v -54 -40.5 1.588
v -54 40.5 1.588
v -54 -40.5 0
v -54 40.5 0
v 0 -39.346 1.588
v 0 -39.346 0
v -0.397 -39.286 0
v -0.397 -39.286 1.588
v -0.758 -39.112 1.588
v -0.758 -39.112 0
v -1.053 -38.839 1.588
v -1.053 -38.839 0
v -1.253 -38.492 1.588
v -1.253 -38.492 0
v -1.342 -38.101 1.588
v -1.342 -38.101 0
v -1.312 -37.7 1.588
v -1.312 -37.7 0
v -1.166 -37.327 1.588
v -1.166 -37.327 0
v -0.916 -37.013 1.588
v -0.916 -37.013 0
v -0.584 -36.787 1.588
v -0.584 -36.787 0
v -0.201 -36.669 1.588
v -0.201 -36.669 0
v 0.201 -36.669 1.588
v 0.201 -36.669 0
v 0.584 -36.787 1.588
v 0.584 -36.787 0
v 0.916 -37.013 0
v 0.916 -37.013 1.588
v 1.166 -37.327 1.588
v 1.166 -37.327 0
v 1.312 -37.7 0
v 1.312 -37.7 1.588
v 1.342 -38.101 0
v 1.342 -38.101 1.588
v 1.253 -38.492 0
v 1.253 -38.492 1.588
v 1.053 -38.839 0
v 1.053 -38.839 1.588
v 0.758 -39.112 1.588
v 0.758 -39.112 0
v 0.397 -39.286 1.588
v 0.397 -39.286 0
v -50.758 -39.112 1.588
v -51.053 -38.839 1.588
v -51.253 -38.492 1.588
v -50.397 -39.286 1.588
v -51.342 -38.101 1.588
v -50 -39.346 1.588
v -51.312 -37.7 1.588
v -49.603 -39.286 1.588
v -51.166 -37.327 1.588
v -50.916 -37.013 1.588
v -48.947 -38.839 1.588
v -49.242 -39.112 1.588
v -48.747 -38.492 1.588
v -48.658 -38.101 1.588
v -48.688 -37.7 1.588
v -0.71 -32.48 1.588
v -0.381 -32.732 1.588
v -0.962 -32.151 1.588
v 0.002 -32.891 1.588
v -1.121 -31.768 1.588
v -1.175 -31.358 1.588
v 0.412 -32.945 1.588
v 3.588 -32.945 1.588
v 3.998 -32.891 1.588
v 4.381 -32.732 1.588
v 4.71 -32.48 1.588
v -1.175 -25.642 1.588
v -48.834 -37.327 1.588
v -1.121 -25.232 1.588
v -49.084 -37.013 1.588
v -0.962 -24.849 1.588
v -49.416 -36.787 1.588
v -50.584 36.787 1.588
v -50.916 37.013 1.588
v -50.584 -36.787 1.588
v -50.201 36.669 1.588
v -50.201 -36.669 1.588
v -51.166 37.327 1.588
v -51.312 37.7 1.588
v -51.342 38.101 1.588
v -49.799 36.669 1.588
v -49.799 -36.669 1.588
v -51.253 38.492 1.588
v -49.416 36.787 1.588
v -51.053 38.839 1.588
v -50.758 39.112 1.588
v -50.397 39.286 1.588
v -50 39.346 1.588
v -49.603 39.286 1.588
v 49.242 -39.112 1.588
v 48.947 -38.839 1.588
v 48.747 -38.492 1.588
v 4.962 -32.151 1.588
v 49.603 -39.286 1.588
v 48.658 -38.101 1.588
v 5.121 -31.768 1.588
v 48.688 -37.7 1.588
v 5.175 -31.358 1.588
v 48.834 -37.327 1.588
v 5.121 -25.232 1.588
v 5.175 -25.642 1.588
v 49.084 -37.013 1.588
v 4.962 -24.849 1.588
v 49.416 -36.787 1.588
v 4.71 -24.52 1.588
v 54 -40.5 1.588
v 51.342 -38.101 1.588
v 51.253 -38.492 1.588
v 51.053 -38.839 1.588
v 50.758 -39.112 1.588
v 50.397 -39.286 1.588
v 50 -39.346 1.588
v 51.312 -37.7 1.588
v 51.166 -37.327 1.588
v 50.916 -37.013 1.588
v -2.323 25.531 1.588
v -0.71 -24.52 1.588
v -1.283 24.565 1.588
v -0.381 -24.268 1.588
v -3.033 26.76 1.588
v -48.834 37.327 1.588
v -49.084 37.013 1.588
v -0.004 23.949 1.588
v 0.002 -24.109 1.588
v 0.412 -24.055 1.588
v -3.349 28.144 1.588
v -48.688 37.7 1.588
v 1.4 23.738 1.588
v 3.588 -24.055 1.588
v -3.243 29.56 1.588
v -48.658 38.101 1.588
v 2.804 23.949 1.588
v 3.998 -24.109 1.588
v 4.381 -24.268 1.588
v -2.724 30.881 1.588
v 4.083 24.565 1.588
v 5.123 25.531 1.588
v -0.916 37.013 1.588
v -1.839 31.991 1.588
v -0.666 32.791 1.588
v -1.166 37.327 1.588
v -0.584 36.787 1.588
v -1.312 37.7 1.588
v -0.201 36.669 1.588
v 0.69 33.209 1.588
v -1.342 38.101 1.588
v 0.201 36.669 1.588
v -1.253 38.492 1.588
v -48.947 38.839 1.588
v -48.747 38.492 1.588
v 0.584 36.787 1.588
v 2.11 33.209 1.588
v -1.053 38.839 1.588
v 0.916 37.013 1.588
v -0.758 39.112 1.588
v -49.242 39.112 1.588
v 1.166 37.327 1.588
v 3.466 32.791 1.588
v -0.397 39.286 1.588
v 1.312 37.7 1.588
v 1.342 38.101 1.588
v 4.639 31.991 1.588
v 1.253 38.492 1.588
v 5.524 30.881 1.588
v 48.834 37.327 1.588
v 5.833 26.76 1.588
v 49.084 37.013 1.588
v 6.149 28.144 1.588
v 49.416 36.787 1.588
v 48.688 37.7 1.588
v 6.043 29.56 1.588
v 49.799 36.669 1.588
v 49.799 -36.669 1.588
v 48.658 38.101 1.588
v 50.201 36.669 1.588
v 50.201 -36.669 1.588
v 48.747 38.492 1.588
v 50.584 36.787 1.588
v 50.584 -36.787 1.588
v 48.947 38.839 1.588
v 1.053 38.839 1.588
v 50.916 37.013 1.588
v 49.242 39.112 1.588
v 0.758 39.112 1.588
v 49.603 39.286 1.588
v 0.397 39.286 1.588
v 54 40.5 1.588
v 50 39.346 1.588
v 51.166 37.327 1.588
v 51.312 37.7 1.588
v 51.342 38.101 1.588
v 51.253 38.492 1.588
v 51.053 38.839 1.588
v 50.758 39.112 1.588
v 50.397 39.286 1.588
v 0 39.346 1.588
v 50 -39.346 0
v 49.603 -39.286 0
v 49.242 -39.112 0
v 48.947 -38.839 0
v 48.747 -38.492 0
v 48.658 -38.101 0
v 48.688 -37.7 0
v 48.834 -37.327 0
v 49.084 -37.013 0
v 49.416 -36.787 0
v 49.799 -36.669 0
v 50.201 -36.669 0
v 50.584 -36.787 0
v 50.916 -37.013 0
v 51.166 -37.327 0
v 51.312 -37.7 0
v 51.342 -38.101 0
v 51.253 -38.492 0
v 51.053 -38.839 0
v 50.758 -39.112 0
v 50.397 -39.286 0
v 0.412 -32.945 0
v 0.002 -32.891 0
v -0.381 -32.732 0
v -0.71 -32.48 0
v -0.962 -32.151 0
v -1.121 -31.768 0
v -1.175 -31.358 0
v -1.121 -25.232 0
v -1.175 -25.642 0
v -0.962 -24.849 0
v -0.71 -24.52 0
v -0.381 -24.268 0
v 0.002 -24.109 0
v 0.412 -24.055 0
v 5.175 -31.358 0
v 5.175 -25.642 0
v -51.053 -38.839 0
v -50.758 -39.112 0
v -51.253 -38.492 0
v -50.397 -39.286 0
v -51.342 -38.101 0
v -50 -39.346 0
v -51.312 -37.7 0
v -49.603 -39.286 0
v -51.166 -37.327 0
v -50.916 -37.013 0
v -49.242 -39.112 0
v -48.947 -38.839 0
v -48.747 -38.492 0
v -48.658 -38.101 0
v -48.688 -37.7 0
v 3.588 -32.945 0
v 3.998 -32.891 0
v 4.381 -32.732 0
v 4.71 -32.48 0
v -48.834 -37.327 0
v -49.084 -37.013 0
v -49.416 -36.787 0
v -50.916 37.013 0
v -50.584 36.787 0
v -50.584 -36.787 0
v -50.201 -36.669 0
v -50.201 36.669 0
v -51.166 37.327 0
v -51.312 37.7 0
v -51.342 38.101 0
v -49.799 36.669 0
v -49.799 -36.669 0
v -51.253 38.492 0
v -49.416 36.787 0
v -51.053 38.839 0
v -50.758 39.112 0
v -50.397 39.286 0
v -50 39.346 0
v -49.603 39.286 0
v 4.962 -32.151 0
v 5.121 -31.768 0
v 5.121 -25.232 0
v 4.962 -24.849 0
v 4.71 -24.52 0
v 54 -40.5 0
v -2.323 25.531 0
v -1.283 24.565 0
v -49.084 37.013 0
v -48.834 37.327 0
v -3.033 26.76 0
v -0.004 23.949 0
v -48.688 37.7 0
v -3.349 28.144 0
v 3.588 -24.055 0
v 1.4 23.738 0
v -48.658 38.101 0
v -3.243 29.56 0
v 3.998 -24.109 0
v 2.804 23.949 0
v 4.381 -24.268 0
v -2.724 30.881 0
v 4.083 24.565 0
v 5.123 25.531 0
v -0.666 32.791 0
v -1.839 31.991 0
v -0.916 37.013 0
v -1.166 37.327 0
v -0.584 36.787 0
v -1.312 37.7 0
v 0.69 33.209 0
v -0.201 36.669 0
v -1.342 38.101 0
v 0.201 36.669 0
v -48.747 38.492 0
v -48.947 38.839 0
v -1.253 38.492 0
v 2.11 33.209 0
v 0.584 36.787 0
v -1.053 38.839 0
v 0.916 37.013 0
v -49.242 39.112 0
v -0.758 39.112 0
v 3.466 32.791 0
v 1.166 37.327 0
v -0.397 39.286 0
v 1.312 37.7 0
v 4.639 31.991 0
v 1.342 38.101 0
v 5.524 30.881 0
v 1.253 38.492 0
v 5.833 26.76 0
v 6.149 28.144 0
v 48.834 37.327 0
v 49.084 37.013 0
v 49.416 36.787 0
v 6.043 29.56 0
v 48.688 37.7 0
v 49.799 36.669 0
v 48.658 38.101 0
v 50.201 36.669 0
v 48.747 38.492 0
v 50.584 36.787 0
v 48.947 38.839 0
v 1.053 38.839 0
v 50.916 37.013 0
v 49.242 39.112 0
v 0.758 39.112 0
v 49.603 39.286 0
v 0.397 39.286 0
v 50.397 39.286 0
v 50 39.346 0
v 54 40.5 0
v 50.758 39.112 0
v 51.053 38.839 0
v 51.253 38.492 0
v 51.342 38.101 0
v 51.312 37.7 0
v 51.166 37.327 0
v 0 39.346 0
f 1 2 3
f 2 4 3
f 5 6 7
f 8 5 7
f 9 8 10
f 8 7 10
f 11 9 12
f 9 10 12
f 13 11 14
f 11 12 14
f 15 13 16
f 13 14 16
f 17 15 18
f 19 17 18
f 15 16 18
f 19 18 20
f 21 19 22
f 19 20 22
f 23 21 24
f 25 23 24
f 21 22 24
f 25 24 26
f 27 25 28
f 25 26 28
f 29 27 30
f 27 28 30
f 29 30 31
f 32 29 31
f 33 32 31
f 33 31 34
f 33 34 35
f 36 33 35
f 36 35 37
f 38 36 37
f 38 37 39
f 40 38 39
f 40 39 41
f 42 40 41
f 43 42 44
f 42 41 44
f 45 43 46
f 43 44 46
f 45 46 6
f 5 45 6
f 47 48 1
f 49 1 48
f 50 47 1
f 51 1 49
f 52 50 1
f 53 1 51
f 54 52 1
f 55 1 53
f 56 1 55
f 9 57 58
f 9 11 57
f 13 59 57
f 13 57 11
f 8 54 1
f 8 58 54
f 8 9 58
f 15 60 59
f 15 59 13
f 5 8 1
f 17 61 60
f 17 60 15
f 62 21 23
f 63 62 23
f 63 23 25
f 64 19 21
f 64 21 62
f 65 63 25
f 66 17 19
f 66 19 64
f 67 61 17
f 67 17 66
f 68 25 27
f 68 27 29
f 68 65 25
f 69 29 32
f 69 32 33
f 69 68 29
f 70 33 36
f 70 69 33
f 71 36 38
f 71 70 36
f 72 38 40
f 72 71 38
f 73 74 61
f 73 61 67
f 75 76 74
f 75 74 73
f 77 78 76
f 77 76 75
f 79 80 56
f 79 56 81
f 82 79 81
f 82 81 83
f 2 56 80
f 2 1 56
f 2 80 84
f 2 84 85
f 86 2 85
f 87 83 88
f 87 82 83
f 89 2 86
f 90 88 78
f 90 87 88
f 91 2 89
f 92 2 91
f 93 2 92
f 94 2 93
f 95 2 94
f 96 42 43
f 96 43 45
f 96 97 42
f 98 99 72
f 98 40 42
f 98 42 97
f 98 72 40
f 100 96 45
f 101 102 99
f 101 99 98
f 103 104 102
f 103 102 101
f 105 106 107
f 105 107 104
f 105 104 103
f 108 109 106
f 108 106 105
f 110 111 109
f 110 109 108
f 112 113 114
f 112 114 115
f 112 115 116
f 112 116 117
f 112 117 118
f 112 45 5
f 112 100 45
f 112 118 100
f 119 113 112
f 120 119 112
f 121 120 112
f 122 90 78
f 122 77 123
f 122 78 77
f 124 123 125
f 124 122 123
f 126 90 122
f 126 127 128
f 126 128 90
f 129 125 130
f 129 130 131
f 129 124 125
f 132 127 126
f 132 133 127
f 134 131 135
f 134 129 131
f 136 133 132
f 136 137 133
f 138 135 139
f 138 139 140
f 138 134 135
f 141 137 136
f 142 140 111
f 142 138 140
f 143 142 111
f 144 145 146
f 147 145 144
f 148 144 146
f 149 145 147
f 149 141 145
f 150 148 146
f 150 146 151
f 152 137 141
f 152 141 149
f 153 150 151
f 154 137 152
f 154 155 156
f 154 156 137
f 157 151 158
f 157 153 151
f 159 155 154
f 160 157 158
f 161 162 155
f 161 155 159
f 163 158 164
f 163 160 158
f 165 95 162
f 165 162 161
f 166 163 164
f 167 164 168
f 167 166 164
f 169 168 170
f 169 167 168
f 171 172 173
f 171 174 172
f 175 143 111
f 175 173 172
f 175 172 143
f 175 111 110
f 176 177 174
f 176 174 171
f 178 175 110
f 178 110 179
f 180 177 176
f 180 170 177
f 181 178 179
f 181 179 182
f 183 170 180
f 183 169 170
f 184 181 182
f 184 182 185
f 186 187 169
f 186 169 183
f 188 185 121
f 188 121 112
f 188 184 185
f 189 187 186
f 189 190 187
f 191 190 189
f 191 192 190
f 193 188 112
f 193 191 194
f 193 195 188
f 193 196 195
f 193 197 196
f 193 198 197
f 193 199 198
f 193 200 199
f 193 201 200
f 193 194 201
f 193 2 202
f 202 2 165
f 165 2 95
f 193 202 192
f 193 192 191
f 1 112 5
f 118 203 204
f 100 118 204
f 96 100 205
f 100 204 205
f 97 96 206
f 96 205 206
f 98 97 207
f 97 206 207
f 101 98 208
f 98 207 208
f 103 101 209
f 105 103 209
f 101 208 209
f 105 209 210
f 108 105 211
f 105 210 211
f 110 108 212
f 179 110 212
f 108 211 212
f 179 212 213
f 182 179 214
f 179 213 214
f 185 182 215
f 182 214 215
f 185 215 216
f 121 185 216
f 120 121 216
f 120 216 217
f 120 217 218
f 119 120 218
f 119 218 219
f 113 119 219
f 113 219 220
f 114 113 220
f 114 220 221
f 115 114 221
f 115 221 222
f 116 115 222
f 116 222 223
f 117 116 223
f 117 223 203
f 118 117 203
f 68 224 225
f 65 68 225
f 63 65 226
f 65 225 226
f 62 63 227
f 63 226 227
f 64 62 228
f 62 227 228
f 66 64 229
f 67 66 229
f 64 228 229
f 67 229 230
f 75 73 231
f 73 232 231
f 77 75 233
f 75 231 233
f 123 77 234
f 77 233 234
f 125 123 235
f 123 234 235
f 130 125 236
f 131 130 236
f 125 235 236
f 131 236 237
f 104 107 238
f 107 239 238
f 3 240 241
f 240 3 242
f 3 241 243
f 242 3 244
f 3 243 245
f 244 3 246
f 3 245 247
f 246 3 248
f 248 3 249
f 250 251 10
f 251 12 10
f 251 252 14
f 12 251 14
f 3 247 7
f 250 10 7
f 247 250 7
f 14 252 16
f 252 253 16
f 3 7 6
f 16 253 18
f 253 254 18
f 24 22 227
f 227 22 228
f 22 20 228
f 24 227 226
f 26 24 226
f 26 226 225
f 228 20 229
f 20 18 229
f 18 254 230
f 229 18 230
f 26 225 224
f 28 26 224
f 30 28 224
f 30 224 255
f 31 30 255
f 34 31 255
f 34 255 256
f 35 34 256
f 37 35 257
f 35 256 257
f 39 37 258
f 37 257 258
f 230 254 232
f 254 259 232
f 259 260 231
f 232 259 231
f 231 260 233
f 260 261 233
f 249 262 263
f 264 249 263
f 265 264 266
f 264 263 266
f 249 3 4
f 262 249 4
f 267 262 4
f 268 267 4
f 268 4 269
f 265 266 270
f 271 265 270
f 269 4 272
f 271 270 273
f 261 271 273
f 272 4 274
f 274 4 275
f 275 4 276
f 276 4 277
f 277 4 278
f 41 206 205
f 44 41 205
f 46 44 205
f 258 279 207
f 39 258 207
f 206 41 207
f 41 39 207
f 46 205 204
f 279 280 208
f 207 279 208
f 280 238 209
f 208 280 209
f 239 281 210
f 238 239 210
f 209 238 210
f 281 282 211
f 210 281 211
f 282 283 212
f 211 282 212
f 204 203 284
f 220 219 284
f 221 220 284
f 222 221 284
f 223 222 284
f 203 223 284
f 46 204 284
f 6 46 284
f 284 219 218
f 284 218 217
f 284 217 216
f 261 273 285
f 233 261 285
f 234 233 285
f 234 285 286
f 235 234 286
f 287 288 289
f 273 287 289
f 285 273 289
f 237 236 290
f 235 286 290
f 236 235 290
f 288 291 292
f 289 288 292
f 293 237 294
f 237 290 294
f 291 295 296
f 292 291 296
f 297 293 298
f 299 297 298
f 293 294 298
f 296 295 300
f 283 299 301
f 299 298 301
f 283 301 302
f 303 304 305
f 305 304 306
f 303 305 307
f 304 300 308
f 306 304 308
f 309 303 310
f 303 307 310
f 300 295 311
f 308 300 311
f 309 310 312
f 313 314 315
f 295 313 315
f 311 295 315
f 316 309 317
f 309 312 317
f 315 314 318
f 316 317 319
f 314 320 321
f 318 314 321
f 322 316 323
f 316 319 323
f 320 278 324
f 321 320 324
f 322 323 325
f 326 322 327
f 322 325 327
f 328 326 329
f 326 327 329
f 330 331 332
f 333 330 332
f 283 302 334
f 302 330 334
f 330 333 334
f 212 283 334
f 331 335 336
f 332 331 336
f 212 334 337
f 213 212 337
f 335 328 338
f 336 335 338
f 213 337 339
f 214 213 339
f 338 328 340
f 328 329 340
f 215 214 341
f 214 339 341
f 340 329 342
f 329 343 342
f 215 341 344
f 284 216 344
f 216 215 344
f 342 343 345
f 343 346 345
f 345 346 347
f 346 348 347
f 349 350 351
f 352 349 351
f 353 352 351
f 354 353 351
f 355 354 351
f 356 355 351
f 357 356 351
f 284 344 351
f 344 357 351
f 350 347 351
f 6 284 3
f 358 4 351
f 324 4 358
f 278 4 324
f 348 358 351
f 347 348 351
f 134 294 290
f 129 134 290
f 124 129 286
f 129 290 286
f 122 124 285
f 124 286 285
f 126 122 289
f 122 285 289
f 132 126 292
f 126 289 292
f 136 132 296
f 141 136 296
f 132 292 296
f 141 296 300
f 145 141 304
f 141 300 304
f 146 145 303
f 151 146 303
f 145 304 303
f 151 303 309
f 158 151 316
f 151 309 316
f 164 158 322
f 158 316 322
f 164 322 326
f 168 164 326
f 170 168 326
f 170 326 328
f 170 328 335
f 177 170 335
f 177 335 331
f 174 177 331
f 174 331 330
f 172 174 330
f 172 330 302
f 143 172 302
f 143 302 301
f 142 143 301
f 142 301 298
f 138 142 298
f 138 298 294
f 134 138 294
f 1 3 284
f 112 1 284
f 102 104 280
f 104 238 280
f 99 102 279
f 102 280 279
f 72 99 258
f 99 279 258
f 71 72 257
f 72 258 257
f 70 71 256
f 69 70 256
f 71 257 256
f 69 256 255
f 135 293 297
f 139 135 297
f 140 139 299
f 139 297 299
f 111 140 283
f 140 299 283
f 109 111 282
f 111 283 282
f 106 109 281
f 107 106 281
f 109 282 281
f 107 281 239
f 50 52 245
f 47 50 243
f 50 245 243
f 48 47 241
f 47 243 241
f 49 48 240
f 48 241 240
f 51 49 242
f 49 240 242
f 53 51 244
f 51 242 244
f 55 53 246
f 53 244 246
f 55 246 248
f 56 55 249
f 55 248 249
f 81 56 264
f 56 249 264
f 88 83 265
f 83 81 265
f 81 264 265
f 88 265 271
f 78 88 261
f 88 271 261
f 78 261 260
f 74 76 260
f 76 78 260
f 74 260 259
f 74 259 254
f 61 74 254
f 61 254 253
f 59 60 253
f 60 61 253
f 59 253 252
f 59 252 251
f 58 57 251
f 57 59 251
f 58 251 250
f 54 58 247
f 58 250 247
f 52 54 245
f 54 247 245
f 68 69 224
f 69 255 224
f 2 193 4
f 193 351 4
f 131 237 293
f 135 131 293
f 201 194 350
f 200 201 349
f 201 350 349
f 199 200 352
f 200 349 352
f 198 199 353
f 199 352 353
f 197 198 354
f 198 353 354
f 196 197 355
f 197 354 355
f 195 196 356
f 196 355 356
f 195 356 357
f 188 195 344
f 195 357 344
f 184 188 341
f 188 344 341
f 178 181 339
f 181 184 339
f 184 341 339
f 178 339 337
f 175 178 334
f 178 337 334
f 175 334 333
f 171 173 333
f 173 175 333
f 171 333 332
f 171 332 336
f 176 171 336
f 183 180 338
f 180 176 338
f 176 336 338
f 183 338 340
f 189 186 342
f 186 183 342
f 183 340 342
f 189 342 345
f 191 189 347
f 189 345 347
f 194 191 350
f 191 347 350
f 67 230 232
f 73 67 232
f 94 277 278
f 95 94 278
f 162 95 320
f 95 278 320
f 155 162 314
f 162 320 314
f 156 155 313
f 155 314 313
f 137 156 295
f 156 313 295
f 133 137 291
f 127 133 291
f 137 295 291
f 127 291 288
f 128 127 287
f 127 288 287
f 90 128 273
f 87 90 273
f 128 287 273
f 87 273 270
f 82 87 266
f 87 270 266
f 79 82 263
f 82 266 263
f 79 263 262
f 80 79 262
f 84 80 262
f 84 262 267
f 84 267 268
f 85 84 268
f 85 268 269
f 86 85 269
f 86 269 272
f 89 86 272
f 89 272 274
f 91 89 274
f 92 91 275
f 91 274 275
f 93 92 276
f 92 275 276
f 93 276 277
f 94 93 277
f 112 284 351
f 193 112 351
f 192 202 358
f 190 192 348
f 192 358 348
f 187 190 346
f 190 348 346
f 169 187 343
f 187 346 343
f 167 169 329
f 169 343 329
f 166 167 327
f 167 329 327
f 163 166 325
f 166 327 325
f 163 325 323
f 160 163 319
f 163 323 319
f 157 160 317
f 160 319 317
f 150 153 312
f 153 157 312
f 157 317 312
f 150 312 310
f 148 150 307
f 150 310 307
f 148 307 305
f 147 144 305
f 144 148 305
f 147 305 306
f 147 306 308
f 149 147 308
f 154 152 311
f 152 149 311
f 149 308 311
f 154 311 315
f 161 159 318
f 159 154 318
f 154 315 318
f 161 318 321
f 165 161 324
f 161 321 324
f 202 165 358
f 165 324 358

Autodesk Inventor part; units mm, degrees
ref_plane "YZ Plane" through (0, 0, 0) normal (1, 0, 0) x (0, 1, 0)
ref_plane "XZ Plane" through (0, 0, 0) normal (0, 1, 0) x (-1, 0, 0)
ref_plane "XY Plane" through (0, 0, 0) normal (0, 0, 1) x (1, 0, 0)
sketch "Sketch1" plane through (0, 0, 0) normal (0, 0, 1) x (1, 0, 0)
  line L0 (-54, -40.5) -> (54, -40.5)
  line L1 (54, -40.5) -> (54, 40.5)
  line L2 (54, 40.5) -> (-54, 40.5)
  line L3 (-54, 40.5) -> (-54, -40.5)
  point P0 (0, 0)
  dimension "d0" = 108
  dimension "d1" = 81
  dimension "d2" = 40.5
  dimension "d3" = 54
extrude "Extrusion1" add sketch "Sketch1" along normal blind 1.5875
hole "Hole2" at (50, -38, 1.5875) direction (0, 0, -1) diameter 2.6924 end through all
mirror "Mirror1" about plane through (0, 0, 0) normal (0, 1, 0) of "Hole2"
hole "Hole_audio" at (1.4, 28.5, 1.5875) direction (0, 0, -1) diameter 9.525 end through all
hole "Hole_mini_usb" [suppressed]
mirror "Mirror2" about plane through (0, 0, 0) normal (1, 0, 0) of "Hole2", "Mirror1"
hole "Hole5" at (0, -38, 1.5875) direction (0, 0, -1) diameter 2.6924 end through all
mirror "Mirror3" about plane through (0, 0, 0) normal (0, 1, 0) of "Hole5"
hole "Hole6" [suppressed]
mirror "Mirror4" [suppressed]
sketch "Sketch2" plane through (0, 0, 0) normal (0, 0, -1) x (-1, 0, 0)
  line L0 (-0.4125, -24.055) -> (-3.5875, -24.055)
  line L1 (-5.175, -25.6425) -> (-5.175, -31.3575)
  line L2 (-3.5875, -32.945) -> (-0.4125, -32.945)
  line L3 (1.175, -31.3575) -> (1.175, -25.6425)
  line L4 (-2, -22.5163) -> (-2, -34.6324)
  line L5 (-9.4902, -28.5) -> (-22.3716, -28.5)
  arc A0 (-0.4125, -32.945) -> (1.175, -31.3575) centre (-0.4125, -31.3575) ccw
  arc A1 (-5.175, -31.3575) -> (-3.5875, -32.945) centre (-3.5875, -31.3575) ccw
  arc A2 (-3.5875, -24.055) -> (-5.175, -25.6425) centre (-3.5875, -25.6425) ccw
  arc A3 (1.175, -25.6425) -> (-0.4125, -24.055) centre (-0.4125, -25.6425) ccw
  line L6 (54, -40.5) -> (-54, -40.5) projected
  point P0 (0, 0)
  point P1 (1.175, -24.055)
  point P2 (-5.175, -32.945)
  point P3 (1.175, -32.945)
  point P4 (-2, -28.5)
  dimension "d80" = 6.35
  dimension "d81" = 8.89
  dimension "d82" = 1.5875
  dimension "d85" = 12
  dimension "d87" = 2
extrude "cutout_mini_usb" cut sketch "Sketch2" against normal through all
sketch "Sketch4" plane through (0, 0, 1.5875) normal (0, 0, 1) x (1, 0, 0)
  line L0 (-54, -40.5) -> (-54, 40.5) projected
  line L1 (54, -40.5) -> (-54, -40.5) projected
  line L2 (54, 40.5) -> (54, -40.5) projected
  line L3 (-54, 40.5) -> (54, 40.5) projected
  line L4 (-53.878, -40.6622) -> (-54, 40.5) construction
  line L5 (-54, 40.5) -> (53.878, 40.6622) construction
  line L6 (53.878, 40.6622) -> (54, -40.5) construction
  line L7 (54, -40.5) -> (-53.878, -40.6622) construction
  point P0 (0, 0)
decal "Decal1"
sketch "Sketch5" plane through (0, 0, 0) normal (0, 0, -1) x (-1, 0, 0)
  line L0 (54, -40.5) -> (-54, -40.5) projected
  line L1 (54, 40.5) -> (54, -40.5) projected
  line L2 (-54, 40.5) -> (54, 40.5) projected
  line L3 (-54, -40.5) -> (-54, 40.5) projected
  line L4 (53.9396, 40.5804) -> (54, -40.5) construction
  line L5 (54, -40.5) -> (-53.9396, -40.5804) construction
  line L6 (-53.9396, -40.5804) -> (-54, 40.5) construction
  line L7 (-54, 40.5) -> (53.9396, 40.5804) construction
  point P0 (0, 0)
decal "Decal2"
properties part number "FOX-ME-119-05" material "FR4"
